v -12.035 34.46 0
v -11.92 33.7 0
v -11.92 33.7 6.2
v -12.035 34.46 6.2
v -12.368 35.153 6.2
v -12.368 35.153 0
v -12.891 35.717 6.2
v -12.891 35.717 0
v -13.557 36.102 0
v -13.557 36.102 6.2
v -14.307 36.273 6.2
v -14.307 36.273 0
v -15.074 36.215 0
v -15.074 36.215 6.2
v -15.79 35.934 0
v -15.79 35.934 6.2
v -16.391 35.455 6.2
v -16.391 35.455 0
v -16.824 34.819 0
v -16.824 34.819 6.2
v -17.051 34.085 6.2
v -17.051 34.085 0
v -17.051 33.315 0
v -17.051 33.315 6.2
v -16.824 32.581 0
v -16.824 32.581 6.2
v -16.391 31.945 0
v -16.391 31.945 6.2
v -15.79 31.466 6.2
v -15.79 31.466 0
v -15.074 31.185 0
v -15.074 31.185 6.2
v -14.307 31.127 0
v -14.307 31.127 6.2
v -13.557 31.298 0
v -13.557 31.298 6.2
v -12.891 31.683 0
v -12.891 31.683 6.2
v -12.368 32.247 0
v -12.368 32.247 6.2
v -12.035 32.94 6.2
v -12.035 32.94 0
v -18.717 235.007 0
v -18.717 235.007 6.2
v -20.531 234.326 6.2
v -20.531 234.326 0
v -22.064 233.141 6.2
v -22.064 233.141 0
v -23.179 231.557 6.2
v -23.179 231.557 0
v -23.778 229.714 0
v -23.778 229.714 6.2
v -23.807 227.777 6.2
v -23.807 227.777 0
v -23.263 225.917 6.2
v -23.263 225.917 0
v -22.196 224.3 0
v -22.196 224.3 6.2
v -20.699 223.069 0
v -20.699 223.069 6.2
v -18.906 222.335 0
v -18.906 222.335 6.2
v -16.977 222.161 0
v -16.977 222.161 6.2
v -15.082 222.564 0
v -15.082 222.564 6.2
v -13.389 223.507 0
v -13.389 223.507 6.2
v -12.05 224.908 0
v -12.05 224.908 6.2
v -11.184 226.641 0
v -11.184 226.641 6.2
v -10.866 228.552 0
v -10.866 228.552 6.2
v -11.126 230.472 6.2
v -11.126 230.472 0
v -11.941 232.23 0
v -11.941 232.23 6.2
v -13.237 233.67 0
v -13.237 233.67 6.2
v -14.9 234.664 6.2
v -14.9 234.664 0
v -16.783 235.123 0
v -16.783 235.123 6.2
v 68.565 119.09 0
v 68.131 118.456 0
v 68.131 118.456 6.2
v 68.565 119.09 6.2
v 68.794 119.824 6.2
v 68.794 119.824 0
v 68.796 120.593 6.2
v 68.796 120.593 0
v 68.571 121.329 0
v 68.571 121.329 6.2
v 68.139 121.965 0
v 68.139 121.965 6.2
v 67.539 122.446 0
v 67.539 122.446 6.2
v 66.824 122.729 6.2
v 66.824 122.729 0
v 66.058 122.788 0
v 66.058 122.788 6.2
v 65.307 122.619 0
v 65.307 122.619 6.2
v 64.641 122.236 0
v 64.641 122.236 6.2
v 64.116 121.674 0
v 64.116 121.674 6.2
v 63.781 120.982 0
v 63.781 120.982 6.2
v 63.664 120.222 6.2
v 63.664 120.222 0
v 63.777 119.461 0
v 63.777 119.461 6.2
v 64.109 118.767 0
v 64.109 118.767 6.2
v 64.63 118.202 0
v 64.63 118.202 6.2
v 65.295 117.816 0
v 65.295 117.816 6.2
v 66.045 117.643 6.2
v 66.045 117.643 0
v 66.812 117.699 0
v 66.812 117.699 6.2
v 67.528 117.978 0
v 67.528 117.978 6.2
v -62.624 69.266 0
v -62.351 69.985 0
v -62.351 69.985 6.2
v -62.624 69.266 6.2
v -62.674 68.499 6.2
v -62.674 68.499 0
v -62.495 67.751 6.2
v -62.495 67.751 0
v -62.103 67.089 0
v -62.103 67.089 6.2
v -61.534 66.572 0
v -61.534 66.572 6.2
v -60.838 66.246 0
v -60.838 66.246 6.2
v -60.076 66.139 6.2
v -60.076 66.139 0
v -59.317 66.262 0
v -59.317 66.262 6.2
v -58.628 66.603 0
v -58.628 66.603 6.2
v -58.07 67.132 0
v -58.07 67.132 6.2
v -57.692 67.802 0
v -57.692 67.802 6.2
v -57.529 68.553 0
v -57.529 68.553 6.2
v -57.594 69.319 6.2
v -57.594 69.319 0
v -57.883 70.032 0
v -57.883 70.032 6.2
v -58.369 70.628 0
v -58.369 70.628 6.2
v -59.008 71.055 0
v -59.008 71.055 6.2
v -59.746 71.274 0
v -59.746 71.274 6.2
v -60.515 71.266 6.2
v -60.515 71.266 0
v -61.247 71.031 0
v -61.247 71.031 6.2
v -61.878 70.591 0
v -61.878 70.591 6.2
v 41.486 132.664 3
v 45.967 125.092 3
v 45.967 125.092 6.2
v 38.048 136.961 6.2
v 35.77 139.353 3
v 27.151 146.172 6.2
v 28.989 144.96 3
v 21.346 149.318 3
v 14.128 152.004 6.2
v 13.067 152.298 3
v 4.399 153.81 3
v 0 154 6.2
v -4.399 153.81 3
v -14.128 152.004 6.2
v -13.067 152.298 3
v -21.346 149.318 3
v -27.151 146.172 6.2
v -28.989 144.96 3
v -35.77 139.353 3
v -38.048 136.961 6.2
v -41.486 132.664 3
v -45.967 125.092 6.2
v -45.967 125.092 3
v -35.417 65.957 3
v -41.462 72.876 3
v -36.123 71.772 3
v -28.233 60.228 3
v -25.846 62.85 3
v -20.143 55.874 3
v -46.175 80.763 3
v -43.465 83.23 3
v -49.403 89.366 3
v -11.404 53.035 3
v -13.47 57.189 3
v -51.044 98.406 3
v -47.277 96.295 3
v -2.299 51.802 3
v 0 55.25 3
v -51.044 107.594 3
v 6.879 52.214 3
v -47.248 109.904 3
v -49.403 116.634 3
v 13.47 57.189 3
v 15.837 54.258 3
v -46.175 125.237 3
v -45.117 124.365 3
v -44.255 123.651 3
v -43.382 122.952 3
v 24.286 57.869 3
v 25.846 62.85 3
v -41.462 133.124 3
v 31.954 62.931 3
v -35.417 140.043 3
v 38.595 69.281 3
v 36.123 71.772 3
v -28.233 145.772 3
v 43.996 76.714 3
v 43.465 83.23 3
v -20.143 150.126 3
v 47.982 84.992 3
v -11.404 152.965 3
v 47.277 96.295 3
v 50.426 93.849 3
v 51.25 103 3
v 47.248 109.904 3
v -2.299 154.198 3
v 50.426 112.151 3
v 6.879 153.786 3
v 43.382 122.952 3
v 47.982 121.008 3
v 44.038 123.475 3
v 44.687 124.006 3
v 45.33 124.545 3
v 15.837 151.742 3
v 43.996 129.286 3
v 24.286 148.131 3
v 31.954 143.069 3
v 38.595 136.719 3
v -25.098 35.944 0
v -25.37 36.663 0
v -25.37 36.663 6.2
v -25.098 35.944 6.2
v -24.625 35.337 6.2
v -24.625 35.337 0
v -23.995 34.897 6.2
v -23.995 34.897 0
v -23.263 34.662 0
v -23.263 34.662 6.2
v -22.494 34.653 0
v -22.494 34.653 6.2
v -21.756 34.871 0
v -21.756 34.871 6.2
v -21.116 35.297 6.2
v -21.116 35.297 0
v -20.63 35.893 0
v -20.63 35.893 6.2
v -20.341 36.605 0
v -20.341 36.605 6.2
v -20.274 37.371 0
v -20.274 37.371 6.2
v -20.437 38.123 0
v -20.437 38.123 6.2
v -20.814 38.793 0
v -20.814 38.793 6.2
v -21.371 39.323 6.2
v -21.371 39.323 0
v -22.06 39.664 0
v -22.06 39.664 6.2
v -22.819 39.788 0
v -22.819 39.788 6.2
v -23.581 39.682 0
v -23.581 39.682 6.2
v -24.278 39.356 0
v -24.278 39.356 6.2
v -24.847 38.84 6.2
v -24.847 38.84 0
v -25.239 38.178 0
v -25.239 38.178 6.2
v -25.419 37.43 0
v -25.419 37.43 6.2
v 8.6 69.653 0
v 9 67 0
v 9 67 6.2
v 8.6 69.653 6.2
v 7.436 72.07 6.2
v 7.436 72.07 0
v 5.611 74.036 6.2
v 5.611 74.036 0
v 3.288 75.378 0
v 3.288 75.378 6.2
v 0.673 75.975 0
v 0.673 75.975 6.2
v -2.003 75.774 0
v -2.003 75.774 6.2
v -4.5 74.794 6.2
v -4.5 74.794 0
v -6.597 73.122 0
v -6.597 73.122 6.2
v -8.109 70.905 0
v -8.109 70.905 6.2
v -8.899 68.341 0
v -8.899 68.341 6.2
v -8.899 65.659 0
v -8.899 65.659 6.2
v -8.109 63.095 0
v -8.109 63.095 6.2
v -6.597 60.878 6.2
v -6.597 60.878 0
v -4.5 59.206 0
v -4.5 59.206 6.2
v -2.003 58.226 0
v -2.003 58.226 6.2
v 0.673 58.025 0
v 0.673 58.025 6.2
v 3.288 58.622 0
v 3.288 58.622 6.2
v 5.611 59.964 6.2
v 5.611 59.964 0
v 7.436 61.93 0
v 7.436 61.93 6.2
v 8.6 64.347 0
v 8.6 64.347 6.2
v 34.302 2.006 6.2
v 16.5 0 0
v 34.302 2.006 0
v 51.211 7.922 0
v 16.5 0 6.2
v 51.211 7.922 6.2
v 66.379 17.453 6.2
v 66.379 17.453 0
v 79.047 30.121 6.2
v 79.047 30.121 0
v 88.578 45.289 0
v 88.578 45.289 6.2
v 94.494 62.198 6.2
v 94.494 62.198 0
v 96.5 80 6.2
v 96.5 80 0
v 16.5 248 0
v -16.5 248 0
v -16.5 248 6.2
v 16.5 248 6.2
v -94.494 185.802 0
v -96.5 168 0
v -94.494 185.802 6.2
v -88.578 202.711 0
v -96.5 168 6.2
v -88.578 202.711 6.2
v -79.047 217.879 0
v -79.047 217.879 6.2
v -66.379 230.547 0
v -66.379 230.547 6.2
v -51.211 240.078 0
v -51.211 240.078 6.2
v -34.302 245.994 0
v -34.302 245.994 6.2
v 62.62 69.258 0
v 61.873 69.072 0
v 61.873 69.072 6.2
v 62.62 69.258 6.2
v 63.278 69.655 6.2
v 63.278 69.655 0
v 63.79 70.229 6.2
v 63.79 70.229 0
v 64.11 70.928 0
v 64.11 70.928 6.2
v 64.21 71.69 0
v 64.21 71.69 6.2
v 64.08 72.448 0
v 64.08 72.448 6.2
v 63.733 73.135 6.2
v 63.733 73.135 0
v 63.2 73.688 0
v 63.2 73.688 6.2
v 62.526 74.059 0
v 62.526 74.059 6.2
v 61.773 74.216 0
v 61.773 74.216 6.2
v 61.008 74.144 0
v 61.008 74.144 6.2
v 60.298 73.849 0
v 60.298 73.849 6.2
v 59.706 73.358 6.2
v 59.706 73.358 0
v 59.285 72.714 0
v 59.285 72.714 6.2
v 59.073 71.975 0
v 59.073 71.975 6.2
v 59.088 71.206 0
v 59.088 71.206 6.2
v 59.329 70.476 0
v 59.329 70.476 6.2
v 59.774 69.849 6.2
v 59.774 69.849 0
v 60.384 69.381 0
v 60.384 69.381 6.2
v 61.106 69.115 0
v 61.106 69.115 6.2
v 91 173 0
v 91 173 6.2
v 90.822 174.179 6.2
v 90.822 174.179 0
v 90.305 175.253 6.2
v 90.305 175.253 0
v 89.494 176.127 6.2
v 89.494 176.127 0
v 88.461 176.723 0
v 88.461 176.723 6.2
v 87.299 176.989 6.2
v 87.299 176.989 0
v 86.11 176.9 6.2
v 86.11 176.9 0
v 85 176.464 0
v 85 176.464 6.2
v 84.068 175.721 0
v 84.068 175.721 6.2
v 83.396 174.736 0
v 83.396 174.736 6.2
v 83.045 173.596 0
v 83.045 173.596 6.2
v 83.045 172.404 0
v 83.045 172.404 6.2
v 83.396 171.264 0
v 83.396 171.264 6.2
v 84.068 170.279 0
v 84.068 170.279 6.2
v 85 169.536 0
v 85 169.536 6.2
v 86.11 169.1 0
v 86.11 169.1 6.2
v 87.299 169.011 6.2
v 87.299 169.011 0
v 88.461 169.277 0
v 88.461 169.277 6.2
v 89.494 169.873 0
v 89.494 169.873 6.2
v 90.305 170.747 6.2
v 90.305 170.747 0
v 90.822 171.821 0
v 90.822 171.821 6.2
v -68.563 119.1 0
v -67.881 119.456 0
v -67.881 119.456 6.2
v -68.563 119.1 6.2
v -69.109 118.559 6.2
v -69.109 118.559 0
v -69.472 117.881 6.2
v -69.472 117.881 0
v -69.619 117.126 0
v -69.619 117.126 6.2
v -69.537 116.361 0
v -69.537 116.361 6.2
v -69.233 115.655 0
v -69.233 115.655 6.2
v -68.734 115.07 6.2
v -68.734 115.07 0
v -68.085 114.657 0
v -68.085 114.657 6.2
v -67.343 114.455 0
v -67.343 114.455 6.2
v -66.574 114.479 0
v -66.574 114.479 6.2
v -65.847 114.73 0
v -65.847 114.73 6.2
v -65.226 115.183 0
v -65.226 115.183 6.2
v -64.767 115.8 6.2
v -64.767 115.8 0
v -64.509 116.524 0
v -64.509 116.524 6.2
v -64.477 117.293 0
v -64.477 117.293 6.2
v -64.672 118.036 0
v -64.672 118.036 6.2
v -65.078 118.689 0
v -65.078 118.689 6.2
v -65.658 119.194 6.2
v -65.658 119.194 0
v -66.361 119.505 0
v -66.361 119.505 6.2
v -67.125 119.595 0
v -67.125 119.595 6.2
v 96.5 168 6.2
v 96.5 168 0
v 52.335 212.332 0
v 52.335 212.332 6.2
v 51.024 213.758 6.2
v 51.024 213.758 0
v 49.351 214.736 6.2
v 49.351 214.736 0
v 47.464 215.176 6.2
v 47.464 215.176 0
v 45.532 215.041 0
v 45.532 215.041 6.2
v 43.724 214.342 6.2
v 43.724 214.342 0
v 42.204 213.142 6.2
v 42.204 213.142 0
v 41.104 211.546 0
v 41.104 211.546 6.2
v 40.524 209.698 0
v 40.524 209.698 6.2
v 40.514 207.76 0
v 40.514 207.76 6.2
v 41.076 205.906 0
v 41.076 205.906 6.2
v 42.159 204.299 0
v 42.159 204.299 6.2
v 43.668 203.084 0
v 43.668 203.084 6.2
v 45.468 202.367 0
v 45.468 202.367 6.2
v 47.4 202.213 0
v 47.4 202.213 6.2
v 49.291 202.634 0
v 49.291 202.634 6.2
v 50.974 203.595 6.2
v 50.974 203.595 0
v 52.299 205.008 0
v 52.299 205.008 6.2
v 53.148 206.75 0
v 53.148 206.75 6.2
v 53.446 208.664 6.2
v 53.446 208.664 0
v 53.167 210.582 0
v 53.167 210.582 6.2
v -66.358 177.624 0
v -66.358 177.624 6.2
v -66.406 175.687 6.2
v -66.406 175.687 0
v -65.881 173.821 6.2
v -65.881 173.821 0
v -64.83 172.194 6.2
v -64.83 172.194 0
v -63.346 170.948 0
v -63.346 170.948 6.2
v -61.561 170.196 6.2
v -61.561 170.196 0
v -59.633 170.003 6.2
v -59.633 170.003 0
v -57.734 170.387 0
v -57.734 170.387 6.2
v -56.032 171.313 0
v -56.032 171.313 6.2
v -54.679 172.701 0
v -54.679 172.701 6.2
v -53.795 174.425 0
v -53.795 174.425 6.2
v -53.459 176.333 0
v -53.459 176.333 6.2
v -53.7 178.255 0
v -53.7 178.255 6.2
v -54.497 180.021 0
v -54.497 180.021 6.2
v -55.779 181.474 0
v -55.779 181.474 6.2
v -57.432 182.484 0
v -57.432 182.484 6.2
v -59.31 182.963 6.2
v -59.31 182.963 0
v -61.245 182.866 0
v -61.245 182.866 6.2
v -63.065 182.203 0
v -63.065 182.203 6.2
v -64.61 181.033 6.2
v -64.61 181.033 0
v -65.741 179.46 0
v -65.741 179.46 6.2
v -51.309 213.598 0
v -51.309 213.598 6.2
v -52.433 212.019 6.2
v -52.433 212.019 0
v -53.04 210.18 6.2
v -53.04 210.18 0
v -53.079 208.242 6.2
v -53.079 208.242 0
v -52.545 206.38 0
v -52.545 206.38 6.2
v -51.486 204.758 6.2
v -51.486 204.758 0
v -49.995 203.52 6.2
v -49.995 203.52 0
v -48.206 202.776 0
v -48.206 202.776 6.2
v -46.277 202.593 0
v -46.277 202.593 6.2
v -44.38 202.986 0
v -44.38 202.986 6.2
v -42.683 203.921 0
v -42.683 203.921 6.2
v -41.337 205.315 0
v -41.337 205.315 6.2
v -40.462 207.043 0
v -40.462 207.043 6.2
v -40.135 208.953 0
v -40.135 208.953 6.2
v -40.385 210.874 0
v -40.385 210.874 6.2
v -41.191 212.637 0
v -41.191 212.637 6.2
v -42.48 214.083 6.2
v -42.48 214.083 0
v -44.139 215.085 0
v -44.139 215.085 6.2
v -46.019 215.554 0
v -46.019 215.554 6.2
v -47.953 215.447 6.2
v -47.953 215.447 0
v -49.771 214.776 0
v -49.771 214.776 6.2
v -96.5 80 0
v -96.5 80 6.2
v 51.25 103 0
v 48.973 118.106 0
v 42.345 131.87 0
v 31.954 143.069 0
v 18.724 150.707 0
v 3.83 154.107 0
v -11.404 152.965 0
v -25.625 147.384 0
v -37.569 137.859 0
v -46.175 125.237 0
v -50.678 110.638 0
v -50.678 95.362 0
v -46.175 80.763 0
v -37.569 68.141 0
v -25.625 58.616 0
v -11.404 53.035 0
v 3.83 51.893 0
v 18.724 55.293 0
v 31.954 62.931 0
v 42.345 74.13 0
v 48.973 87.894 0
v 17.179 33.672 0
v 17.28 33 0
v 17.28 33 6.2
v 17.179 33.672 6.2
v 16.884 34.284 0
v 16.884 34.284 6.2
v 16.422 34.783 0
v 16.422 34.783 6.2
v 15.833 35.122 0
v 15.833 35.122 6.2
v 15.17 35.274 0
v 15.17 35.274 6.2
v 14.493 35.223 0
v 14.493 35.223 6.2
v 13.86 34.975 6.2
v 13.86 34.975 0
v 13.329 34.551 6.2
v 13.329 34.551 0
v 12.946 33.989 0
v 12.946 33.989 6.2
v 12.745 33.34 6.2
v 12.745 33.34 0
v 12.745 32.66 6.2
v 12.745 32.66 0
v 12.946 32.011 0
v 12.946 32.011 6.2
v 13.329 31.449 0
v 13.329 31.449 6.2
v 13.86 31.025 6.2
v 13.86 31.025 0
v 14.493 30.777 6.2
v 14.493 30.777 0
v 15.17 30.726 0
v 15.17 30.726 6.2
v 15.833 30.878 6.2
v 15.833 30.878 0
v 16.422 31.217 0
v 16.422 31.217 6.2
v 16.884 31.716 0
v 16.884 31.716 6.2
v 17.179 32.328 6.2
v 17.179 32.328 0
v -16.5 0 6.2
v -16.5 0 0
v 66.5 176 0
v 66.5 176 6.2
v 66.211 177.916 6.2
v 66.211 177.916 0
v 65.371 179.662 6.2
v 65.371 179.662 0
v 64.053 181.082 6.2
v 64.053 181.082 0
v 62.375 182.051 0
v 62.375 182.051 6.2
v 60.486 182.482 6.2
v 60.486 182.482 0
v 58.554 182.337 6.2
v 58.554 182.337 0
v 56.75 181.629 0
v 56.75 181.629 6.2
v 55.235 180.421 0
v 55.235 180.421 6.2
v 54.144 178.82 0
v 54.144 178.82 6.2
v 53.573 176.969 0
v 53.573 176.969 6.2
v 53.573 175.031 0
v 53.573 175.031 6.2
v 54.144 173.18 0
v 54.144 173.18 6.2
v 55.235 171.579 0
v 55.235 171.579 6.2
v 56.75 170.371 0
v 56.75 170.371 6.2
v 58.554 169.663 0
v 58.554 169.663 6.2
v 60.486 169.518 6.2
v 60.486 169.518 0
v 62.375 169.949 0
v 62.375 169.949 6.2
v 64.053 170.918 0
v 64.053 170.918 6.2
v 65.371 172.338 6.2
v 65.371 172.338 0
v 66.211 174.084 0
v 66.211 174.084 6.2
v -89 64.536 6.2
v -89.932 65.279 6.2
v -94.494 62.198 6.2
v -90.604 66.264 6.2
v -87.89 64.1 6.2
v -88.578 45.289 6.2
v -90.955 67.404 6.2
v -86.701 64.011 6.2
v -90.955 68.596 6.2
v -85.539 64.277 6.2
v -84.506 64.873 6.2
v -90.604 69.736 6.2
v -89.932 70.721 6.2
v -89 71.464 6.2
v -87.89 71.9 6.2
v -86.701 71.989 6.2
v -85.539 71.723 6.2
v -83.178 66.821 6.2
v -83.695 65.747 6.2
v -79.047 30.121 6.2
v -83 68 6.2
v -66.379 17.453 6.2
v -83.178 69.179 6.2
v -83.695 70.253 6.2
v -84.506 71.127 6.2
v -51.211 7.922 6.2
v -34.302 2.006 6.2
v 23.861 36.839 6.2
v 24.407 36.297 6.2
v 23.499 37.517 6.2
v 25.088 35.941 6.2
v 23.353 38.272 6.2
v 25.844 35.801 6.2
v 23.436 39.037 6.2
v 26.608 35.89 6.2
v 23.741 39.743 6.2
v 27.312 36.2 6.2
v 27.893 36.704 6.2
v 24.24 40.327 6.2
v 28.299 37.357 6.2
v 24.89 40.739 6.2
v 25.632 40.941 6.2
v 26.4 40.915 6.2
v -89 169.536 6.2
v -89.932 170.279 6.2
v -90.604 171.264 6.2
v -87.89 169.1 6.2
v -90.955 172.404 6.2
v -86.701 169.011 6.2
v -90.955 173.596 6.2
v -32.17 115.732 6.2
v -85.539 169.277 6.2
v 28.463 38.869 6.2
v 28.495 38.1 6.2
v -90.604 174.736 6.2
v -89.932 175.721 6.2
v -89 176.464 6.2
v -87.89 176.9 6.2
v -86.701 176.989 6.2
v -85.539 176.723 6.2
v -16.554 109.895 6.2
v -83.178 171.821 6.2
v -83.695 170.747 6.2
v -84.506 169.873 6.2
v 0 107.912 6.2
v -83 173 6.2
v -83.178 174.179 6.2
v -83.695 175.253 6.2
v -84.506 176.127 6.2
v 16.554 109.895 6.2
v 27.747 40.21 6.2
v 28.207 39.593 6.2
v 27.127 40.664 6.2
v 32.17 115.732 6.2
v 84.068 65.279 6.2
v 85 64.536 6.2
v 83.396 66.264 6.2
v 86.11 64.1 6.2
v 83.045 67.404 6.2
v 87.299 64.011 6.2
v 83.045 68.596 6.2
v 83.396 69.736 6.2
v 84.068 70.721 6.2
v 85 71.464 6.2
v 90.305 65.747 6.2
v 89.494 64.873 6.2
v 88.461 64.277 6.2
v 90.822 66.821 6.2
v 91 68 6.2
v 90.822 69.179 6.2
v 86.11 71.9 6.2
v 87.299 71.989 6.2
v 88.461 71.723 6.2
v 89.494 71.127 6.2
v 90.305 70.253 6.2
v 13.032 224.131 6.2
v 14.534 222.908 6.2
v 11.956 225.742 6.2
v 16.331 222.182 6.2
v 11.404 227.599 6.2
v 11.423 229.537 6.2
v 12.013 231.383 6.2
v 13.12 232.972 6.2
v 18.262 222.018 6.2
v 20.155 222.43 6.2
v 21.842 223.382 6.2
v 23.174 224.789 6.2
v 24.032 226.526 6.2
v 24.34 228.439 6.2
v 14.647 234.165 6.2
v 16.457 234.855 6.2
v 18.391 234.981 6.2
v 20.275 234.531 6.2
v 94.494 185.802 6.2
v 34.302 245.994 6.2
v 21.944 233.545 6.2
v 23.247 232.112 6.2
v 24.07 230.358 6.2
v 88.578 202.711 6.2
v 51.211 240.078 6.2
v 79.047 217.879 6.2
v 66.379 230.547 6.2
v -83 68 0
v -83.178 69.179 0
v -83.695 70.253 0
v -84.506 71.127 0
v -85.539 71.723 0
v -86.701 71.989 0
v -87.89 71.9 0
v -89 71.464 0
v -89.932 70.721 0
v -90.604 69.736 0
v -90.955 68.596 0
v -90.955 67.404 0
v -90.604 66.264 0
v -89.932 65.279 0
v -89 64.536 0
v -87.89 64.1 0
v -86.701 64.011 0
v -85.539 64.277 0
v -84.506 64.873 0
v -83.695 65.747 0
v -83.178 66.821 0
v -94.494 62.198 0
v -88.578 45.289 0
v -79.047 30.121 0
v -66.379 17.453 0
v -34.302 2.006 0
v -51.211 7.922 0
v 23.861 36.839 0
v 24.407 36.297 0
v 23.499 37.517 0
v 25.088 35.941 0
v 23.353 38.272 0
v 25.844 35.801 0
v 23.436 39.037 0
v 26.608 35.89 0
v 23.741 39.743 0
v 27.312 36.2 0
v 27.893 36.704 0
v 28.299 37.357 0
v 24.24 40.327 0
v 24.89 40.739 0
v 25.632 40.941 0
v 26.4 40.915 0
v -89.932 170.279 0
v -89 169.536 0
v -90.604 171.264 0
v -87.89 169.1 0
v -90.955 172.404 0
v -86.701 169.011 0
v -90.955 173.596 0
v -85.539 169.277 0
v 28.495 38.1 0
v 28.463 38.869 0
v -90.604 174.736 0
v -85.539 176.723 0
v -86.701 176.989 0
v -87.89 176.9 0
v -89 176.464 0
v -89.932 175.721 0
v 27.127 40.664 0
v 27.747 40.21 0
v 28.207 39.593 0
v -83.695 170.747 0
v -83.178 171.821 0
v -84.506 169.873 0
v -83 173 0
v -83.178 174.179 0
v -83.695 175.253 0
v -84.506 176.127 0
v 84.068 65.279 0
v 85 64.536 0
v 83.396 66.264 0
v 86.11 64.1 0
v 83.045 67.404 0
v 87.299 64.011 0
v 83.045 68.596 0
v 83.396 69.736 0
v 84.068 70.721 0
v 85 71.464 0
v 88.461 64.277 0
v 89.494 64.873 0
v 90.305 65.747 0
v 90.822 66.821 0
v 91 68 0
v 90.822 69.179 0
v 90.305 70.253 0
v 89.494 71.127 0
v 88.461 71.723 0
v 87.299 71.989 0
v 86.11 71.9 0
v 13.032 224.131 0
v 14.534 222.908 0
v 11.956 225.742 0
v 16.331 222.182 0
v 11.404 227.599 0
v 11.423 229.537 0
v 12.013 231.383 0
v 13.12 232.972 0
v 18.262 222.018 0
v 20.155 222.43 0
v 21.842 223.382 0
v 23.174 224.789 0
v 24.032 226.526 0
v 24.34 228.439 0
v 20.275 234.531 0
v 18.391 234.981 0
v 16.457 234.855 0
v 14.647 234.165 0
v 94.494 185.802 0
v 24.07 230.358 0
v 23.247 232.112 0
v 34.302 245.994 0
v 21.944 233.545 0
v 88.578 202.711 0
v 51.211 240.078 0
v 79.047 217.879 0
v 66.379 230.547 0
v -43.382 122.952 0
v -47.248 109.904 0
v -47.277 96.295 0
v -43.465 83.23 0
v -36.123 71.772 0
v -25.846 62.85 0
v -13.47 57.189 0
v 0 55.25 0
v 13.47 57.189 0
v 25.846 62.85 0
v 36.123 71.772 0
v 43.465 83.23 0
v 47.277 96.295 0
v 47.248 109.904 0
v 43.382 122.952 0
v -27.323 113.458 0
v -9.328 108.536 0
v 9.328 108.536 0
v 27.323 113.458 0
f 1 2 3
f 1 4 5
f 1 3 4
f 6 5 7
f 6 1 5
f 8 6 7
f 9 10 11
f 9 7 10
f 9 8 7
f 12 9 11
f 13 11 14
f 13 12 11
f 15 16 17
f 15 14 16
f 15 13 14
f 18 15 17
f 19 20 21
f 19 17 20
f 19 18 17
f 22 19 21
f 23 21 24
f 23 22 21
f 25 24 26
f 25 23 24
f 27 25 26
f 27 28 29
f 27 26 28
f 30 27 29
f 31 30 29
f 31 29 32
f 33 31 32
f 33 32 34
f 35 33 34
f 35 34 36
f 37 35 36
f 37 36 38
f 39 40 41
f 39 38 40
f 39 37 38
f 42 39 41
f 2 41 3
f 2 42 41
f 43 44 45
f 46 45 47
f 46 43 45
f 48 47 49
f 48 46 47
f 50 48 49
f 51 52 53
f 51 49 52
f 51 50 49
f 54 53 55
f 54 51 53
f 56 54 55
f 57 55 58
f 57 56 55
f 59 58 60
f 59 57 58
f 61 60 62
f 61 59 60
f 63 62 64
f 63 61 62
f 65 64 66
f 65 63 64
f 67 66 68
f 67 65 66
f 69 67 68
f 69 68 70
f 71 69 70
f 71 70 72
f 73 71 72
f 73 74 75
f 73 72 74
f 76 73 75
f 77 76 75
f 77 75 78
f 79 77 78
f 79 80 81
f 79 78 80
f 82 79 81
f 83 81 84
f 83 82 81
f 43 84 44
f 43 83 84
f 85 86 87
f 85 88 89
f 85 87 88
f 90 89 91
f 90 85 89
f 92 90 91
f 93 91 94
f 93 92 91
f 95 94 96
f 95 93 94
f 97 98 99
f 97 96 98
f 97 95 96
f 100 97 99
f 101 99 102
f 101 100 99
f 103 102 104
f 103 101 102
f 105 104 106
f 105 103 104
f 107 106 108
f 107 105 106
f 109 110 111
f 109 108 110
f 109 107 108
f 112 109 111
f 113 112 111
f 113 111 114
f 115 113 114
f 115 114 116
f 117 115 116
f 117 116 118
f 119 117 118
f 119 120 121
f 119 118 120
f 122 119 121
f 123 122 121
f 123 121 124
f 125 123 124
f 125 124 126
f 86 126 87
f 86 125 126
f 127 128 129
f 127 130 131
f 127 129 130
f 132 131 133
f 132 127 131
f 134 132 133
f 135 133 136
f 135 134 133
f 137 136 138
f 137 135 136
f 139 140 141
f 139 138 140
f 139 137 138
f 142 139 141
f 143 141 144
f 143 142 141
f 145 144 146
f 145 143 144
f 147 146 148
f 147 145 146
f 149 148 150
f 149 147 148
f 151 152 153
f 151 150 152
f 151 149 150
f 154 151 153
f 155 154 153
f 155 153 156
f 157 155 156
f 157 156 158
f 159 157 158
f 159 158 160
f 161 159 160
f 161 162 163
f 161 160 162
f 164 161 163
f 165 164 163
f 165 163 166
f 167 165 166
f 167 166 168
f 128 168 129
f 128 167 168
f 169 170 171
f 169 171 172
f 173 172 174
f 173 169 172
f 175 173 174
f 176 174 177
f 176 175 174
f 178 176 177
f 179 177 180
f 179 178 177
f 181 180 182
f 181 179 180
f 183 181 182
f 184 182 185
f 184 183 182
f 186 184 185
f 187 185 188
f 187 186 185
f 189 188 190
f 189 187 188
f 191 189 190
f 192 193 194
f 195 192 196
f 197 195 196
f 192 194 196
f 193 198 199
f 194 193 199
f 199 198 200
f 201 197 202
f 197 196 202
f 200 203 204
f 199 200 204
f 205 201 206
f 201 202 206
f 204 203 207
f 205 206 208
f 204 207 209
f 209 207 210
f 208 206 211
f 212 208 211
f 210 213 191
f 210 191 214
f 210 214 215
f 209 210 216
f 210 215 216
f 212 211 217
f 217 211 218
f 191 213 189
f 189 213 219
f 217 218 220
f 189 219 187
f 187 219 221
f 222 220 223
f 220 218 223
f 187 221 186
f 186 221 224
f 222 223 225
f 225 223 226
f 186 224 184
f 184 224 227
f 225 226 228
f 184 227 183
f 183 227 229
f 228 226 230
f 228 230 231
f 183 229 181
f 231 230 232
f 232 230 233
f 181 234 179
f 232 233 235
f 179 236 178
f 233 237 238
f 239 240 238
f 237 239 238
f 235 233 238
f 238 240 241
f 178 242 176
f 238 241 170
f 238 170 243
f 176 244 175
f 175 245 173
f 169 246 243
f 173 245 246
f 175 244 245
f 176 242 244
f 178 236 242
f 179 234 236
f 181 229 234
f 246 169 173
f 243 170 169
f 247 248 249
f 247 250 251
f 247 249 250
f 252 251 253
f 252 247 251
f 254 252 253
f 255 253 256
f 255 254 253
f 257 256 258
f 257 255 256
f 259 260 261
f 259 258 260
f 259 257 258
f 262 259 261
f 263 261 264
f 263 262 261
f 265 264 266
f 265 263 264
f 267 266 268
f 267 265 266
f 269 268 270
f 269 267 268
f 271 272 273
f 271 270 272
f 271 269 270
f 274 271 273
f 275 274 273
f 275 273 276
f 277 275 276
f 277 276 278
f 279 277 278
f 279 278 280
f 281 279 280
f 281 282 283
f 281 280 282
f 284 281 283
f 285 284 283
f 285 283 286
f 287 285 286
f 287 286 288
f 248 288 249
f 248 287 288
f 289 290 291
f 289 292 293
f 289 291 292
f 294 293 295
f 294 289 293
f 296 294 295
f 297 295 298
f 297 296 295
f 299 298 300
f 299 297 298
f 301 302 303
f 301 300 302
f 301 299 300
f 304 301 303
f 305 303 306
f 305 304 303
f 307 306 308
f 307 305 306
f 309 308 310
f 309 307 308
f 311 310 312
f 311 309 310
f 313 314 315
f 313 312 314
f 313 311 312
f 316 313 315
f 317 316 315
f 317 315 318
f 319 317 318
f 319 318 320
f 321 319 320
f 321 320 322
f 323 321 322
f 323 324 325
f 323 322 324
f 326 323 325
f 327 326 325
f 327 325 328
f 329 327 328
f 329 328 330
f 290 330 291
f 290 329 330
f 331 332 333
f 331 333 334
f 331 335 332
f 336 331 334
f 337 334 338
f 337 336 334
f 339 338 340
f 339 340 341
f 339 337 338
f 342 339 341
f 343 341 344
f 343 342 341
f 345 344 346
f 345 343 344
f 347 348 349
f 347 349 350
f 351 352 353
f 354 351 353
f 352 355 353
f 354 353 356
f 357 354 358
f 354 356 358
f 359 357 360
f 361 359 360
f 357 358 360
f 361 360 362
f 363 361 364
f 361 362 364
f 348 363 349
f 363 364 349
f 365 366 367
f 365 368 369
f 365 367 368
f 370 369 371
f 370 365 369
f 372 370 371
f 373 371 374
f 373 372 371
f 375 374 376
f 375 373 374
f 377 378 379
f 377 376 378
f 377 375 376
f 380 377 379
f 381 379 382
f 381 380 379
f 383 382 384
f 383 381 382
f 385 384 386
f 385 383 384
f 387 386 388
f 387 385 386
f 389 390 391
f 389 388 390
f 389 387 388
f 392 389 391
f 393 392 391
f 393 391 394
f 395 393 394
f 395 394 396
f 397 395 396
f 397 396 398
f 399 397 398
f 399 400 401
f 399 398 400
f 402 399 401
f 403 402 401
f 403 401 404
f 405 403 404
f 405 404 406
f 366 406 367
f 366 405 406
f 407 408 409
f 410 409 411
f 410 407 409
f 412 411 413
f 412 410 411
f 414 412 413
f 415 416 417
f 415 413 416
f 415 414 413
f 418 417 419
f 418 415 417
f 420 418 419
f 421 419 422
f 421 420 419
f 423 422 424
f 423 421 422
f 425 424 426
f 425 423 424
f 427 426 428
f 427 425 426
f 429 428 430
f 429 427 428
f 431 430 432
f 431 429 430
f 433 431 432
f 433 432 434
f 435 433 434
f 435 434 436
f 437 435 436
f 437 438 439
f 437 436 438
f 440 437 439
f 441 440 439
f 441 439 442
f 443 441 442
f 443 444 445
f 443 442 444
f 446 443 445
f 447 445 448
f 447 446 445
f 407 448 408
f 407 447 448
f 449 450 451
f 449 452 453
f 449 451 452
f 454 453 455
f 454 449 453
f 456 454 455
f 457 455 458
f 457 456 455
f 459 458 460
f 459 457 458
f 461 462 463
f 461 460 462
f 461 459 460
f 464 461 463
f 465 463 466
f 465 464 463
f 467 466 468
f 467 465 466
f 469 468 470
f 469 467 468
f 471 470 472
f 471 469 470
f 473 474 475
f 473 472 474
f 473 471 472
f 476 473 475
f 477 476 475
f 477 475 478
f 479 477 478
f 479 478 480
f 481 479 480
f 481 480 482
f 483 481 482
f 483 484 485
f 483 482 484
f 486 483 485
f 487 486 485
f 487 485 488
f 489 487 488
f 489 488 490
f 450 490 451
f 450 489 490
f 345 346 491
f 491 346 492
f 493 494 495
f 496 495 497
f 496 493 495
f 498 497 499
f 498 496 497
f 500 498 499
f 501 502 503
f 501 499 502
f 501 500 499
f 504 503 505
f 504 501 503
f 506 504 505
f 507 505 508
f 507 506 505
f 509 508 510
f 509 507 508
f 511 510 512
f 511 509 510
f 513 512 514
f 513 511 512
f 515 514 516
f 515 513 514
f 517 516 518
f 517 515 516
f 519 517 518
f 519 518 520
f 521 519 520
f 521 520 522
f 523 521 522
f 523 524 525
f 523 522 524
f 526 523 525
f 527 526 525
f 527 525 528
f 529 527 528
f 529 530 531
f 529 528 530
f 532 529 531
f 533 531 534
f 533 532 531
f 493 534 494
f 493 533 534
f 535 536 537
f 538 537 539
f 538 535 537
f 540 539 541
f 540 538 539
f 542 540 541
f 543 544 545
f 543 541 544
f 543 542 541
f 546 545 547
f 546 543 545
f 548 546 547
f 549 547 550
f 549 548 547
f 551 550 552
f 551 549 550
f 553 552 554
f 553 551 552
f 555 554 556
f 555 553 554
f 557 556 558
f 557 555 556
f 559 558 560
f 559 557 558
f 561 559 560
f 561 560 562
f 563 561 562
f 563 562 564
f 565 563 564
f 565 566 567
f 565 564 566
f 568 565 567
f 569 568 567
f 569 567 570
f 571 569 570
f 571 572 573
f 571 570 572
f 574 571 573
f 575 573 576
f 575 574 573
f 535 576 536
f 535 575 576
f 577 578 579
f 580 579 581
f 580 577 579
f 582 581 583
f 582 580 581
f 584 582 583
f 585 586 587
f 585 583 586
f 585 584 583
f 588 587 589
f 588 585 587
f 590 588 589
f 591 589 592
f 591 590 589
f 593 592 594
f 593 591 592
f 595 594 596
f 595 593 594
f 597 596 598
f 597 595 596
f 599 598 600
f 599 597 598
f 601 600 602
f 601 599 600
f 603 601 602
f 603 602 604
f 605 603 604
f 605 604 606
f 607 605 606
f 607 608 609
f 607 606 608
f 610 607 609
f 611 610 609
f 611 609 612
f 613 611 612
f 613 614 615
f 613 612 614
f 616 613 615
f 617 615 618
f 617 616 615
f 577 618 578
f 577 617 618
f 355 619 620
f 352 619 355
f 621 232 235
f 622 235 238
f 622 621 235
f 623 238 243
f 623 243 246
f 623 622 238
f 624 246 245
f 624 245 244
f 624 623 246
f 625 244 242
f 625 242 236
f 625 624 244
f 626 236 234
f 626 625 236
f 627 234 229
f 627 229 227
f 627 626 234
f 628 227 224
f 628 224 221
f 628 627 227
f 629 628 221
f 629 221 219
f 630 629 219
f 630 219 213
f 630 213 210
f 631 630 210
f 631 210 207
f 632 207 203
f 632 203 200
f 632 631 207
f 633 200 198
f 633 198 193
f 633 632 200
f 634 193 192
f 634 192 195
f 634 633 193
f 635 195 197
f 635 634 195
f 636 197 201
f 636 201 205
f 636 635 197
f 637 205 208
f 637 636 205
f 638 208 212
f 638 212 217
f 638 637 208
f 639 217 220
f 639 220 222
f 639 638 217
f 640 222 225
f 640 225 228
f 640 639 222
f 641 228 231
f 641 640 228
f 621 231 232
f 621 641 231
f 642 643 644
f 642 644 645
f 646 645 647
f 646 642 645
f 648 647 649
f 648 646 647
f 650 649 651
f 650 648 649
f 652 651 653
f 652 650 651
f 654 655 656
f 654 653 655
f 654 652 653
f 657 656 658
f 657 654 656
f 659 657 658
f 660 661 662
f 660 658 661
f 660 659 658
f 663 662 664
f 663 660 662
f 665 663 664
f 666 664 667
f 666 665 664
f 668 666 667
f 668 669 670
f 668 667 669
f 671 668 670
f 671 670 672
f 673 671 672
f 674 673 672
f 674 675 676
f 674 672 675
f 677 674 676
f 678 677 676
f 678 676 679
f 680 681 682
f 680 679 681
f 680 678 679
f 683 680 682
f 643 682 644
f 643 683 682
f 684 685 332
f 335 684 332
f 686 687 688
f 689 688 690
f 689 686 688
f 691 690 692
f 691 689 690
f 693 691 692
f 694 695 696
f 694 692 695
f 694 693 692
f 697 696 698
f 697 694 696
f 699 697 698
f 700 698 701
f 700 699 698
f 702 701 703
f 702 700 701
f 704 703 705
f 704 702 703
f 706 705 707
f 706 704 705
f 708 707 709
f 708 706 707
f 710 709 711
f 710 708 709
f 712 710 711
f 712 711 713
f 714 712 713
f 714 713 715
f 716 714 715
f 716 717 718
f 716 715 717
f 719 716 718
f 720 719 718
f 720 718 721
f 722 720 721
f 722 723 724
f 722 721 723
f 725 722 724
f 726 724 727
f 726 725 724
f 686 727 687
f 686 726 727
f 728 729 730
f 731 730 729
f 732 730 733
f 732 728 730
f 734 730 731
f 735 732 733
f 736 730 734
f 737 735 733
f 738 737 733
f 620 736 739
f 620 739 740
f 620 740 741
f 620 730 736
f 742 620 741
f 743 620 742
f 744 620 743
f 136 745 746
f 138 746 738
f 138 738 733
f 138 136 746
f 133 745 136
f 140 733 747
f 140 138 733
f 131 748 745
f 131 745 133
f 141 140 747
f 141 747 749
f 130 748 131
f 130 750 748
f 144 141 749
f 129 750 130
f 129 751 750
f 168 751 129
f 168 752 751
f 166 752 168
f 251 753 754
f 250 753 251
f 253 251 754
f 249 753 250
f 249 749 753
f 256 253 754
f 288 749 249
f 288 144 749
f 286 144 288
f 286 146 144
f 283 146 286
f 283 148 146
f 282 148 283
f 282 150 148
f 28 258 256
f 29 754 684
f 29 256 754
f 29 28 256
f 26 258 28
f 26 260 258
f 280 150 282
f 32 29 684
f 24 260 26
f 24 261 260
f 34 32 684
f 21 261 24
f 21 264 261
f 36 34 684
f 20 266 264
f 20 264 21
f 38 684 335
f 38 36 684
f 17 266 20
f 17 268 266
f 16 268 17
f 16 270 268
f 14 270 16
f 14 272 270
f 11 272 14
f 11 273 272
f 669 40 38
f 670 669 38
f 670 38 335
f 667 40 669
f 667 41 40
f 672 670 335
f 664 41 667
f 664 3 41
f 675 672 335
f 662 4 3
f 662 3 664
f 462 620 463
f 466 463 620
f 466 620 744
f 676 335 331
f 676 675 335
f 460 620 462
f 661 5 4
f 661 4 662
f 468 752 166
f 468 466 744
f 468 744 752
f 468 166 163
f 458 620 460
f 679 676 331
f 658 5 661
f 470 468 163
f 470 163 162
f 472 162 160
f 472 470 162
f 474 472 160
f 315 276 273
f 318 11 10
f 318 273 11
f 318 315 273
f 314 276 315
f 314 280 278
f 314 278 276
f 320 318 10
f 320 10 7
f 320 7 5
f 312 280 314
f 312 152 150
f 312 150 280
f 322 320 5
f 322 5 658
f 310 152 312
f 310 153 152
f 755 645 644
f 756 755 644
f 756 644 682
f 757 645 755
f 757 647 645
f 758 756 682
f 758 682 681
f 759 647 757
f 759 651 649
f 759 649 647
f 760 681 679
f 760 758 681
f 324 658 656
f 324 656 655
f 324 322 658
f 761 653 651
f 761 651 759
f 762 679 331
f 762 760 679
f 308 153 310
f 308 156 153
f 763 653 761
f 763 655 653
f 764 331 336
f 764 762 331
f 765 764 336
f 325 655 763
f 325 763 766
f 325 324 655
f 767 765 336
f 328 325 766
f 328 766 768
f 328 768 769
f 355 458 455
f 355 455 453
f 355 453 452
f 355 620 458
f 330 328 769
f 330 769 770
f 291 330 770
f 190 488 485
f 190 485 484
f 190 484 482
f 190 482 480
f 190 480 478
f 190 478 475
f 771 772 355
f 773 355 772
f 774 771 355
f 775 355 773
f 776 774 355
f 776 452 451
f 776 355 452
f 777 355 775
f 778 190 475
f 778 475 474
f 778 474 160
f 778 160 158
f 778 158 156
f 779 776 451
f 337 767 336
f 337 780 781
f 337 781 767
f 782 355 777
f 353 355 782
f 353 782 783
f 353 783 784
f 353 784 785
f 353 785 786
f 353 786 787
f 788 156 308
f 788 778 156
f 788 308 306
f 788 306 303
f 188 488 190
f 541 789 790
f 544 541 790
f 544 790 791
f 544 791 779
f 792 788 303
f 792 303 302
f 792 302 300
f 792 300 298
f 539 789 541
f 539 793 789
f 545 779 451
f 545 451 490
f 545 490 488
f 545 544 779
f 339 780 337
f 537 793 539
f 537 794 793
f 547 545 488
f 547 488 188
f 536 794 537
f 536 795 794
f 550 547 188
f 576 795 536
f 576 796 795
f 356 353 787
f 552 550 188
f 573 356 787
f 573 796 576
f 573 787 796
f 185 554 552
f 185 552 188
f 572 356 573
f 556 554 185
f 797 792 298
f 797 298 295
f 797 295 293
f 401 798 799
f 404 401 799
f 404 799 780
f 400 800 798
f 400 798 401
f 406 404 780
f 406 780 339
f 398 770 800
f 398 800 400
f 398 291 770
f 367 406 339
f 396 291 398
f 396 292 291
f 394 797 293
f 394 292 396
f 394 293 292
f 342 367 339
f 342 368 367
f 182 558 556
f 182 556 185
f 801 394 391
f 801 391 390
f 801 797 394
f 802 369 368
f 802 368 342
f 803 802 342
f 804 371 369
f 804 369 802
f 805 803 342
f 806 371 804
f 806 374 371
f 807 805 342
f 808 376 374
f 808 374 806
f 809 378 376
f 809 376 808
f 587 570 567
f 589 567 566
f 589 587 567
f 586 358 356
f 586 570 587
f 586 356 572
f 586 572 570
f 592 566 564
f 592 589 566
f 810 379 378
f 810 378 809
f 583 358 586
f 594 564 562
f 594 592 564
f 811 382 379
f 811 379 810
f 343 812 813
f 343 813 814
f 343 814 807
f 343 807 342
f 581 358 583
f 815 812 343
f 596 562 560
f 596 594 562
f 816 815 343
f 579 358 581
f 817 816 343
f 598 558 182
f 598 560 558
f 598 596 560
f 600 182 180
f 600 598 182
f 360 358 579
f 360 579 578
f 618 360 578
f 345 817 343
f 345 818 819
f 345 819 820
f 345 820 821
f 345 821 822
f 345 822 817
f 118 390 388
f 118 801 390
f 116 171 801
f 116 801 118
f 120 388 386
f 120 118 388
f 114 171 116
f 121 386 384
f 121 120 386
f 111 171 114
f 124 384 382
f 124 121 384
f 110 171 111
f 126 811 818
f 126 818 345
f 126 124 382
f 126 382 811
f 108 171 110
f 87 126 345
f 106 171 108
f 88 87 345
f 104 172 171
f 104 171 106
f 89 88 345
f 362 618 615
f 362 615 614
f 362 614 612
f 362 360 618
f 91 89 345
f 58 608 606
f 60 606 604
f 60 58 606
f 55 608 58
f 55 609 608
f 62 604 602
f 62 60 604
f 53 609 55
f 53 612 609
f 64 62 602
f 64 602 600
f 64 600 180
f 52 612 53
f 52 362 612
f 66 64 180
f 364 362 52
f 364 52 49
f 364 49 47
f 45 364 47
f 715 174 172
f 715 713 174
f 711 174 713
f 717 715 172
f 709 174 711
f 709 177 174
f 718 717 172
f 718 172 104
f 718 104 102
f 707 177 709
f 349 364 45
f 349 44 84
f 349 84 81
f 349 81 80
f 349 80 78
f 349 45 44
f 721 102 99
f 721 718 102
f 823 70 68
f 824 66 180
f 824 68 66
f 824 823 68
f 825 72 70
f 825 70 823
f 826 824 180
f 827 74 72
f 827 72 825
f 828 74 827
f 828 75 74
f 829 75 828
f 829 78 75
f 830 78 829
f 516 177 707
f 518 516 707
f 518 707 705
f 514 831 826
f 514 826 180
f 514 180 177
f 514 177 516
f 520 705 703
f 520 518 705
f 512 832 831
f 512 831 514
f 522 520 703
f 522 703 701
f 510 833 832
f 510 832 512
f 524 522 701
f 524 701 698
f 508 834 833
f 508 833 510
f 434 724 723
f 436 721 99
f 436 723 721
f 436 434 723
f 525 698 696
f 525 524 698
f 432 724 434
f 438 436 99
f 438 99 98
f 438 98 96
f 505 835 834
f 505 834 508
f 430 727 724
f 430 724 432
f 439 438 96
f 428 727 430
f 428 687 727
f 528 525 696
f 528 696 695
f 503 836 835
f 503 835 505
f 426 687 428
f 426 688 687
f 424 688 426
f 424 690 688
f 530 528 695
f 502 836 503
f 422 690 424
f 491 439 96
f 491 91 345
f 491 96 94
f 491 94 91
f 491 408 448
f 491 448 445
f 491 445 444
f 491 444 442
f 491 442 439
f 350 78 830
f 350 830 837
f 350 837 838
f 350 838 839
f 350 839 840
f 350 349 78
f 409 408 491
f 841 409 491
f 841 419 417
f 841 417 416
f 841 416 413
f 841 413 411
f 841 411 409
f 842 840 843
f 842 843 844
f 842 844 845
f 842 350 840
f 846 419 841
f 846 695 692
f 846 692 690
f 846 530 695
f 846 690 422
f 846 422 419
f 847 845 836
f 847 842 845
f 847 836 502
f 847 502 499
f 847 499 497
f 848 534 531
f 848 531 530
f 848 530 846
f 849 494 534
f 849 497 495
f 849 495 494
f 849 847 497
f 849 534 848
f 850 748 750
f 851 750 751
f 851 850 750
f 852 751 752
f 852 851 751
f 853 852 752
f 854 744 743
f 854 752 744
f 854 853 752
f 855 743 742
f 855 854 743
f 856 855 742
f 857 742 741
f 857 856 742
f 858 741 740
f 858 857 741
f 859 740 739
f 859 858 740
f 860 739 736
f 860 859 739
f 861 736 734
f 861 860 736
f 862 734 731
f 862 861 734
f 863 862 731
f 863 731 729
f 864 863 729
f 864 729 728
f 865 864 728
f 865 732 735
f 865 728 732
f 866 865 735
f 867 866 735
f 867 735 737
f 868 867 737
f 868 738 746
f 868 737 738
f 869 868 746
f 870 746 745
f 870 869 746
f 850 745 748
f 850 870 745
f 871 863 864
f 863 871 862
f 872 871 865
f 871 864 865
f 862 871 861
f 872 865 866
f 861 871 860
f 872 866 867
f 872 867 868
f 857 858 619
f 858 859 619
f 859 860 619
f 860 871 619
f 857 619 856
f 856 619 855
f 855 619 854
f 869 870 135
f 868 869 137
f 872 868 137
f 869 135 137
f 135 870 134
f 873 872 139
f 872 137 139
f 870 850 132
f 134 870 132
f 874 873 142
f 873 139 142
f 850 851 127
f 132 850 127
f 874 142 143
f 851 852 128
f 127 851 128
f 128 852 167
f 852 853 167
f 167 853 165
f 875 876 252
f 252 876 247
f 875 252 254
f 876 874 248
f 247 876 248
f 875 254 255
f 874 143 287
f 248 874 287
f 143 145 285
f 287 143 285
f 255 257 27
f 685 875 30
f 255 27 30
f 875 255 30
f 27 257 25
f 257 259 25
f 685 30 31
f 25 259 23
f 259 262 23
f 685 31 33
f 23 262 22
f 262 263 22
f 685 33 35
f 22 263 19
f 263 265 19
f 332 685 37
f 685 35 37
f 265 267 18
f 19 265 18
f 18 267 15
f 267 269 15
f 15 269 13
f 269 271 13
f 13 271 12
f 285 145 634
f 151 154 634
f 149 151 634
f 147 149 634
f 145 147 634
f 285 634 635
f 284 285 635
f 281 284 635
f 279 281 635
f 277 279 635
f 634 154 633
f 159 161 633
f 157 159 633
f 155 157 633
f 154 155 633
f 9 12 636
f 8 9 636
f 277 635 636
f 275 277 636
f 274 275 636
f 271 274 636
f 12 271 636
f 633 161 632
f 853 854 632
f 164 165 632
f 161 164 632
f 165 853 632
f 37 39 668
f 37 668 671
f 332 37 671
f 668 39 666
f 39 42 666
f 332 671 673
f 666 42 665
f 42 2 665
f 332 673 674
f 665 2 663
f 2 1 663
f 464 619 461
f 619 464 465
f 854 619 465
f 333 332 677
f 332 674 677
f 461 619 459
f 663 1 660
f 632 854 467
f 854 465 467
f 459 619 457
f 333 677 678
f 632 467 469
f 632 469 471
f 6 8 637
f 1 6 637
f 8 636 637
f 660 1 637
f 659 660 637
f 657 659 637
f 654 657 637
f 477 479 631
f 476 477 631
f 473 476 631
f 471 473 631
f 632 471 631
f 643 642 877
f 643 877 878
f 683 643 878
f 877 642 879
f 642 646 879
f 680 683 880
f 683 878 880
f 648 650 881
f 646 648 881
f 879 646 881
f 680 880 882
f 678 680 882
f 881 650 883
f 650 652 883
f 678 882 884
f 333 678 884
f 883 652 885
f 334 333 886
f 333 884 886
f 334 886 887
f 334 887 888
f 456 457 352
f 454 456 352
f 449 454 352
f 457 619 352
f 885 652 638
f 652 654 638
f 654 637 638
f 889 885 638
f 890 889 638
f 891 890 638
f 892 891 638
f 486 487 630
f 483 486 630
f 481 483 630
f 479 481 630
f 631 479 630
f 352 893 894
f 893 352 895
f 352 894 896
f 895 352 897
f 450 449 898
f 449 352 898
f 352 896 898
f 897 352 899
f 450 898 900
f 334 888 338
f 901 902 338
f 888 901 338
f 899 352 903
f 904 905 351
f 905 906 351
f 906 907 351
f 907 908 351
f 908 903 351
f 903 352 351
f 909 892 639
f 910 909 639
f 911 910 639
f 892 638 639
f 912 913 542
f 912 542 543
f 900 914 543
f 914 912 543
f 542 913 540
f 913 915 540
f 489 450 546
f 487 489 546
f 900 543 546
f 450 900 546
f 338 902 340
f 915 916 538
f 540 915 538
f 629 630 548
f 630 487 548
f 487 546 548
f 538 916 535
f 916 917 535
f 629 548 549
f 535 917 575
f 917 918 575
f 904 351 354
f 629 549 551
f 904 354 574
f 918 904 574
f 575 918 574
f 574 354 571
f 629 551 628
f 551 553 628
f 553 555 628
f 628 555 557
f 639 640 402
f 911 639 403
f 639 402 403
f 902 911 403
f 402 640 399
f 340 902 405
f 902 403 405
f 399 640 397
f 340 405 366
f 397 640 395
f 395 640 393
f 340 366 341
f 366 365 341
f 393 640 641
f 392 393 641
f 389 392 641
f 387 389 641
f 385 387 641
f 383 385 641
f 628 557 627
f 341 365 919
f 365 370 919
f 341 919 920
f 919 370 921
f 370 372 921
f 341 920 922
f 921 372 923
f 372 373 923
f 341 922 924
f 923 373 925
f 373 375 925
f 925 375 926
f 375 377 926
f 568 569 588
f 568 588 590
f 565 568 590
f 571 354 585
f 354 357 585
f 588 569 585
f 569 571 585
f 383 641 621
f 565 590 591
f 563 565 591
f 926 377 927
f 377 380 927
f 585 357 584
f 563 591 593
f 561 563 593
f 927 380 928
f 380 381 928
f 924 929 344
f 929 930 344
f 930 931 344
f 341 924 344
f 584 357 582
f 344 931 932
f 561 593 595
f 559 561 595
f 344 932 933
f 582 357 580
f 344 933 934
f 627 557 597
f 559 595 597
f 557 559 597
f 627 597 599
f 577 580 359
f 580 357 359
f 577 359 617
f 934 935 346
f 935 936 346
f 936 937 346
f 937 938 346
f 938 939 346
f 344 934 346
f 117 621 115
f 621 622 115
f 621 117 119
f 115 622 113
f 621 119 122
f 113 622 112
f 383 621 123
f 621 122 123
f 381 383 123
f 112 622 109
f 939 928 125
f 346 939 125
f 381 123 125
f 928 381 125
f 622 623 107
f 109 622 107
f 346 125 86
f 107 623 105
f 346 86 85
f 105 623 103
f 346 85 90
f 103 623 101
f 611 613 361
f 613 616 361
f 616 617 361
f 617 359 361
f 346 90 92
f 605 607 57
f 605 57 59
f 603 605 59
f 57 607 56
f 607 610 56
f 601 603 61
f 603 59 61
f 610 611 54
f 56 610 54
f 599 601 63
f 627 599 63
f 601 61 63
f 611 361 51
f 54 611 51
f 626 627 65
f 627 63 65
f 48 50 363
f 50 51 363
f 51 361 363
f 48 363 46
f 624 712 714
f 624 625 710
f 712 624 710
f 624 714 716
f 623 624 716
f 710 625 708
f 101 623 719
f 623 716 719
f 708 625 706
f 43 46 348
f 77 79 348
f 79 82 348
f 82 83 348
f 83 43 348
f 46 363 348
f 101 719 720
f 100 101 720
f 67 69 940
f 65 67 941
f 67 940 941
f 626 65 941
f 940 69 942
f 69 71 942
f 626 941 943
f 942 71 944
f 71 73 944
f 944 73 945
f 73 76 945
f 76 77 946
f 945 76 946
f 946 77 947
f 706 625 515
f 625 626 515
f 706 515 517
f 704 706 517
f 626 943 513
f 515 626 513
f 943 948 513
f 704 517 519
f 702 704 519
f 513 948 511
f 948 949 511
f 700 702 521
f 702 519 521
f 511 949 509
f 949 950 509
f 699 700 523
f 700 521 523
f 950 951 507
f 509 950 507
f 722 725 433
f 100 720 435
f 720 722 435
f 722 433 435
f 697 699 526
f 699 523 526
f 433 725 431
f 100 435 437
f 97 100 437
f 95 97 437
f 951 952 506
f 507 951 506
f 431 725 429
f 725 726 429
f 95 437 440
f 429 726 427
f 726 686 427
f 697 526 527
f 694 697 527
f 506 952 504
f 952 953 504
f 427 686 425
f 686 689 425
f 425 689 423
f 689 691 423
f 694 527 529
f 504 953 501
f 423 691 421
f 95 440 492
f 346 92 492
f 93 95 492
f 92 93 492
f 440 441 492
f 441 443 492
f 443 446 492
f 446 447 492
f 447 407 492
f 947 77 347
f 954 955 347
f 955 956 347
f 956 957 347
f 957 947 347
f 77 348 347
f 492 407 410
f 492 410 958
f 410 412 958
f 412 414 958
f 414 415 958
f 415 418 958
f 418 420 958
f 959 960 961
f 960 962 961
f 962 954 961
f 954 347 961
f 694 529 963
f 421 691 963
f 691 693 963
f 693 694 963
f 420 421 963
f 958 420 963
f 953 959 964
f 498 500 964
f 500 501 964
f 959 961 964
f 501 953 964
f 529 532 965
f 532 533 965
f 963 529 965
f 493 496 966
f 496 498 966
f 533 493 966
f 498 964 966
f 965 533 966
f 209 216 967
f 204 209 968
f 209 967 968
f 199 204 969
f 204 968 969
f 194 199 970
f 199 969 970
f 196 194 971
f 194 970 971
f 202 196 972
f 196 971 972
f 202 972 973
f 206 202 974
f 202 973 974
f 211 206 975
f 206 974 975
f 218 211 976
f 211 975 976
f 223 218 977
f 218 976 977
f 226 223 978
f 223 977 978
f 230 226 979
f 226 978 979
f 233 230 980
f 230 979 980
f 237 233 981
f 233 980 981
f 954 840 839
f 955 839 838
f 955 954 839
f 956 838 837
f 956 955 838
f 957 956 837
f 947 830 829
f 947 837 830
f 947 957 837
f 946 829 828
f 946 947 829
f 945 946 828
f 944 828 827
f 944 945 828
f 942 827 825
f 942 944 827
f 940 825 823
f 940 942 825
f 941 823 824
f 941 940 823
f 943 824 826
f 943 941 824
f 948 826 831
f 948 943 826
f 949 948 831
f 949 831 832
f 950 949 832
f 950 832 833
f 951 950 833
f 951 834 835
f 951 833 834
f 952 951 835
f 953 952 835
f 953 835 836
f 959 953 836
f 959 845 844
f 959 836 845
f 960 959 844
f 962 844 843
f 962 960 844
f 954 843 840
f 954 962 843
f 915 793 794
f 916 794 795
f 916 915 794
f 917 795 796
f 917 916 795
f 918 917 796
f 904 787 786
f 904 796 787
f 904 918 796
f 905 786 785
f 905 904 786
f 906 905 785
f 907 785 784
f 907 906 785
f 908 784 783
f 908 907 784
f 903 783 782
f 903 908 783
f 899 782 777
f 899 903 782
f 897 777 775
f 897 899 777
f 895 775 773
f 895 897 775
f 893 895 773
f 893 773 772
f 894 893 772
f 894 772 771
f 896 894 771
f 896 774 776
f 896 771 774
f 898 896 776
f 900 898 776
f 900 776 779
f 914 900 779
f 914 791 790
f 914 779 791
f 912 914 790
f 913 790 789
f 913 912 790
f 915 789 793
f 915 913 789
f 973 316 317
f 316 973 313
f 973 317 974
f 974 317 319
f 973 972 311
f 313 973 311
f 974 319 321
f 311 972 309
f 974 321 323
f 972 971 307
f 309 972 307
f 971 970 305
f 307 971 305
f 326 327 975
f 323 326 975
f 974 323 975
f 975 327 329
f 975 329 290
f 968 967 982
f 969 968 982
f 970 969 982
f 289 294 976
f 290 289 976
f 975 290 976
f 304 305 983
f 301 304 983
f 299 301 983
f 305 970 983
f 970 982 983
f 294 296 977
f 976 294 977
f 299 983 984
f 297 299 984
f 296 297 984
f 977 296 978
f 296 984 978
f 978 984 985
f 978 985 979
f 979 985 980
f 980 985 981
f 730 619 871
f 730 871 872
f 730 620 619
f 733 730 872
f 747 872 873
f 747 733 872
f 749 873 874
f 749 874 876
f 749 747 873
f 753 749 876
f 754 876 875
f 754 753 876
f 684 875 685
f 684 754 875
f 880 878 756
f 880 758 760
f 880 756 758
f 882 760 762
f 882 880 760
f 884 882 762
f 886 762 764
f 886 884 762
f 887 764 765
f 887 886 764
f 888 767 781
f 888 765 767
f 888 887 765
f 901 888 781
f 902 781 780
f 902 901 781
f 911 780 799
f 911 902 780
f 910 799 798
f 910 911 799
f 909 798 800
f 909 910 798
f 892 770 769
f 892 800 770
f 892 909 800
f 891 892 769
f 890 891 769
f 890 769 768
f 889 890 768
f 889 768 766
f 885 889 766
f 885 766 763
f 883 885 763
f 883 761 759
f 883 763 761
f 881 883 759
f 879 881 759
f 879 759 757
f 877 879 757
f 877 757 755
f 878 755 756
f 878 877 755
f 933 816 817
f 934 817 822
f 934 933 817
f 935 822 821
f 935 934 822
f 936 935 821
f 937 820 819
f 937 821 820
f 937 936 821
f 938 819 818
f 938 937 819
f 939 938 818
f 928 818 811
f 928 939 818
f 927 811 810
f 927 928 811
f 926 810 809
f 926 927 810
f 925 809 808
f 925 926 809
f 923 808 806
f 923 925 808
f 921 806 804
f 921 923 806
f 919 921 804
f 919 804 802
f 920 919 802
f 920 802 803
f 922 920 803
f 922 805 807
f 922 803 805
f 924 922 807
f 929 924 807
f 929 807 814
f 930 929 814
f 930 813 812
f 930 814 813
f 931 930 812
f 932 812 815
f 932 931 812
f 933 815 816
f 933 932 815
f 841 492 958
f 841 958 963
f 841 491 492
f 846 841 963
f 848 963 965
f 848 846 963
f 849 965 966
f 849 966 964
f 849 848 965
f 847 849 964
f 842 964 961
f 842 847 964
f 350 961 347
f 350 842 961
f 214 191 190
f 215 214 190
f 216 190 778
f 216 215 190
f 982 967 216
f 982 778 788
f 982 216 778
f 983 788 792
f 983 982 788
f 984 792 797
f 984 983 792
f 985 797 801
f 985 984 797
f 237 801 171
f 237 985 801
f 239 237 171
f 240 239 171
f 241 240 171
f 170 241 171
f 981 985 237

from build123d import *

# Parameters (mm, degrees)
CYLINDER170_R         = 6.5
CYLINDER170_DEPTH     = 10
ARRAY001_COUNT        = 6
ARRAY001_ANGLE        = 170
CYLINDER012_R         = 2.579687
CYLINDER012_DEPTH     = 19.5
ARRAY_COUNT           = 6
ARRAY_ANGLE           = 208
ARRAY_PLACEMENT_ANGLE = 109
CYLINDER052_R         = 47.75
CYLINDER052_DEPTH     = 3
CYLINDER051_R         = 51.25
CYLINDER051_DEPTH     = 3
CYLINDER164_R         = 2.28
CYLINDER164_DEPTH     = 29
CYLINDER163_R         = 2.58
CYLINDER163_DEPTH     = 29
CYLINDER159_R         = 9
CYLINDER159_DEPTH     = 21
CYLINDER165_R         = 4
CYLINDER165_DEPTH     = 10
CYLINDER166_R         = 4
CYLINDER166_DEPTH     = 10
CYLINDER167_R         = 4
CYLINDER167_DEPTH     = 10
CYLINDER168_R         = 4
CYLINDER168_DEPTH     = 10
CYLINDER005_R         = 51
CYLINDER005_DEPTH     = 20
CYLINDER004_R         = 70.0875
CYLINDER004_DEPTH     = 20
BOX_W                 = 193
BOX_H                 = 248
BOX_DEPTH             = 6.2
FILLET_R              = 80


with BuildPart() as array001:
    # Cylinder170 → Cylinder170 (new body)
    with BuildSketch(Plane(origin=(60, 181, 0), x_dir=(1, 0, 0), z_dir=(0, 0, 1))):
        Circle(CYLINDER170_R)
    extrude(amount=CYLINDER170_DEPTH)

    # Array001: Array001 ×6 about axis
    array001_axis = Axis((0, 176, 0), (0, 0, 1))


with BuildPart() as array001_1:
    add(array001.part)
    for i in range(1, ARRAY001_COUNT):
        add(array001.part.rotate(array001_axis, i * ARRAY001_ANGLE / (ARRAY001_COUNT - 1)))


with BuildPart() as array001_2:
    # Array001 placement: moved
    add(array001_1.part.moved(Location((0, -5, 0))))


with BuildPart() as turbomounts:
    # Cylinder012 → Cylinder012 (new body)
    with BuildSketch(Plane(origin=(36.025, 58.5, -4), x_dir=(1, 0, 0), z_dir=(0, 0, 1))):
        Circle(CYLINDER012_R)
    extrude(amount=CYLINDER012_DEPTH)

    # Array: TurboMounts ×6 about axis
    array_axis = Axis((0, 0, 0), (0, 0, 1))


with BuildPart() as turbomounts_1:
    add(turbomounts.part)
    for i in range(1, ARRAY_COUNT):
        add(turbomounts.part.rotate(array_axis, i * ARRAY_ANGLE / (ARRAY_COUNT - 1)))


with BuildPart() as turbomounts_2:
    # Array placement: moved
    add(turbomounts_1.part.moved(Location((0, 102, 0))).rotate(Axis((0, 102, 0), (0, 0, 1)), ARRAY_PLACEMENT_ANGLE))


with BuildPart() as flange002:
    # Cylinder052 → Cylinder052 (new body)
    with BuildSketch(Plane(origin=(0, 68, 0), x_dir=(1, 0, 0), z_dir=(0, 0, 1))):
        Circle(CYLINDER052_R)
    extrude(amount=CYLINDER052_DEPTH)


with BuildPart() as centeringringgroove:
    # Cylinder051 → Cylinder051 (new body)
    with BuildSketch(Plane(origin=(0, 68, 0), x_dir=(1, 0, 0), z_dir=(0, 0, 1))):
        Circle(CYLINDER051_R)
    extrude(amount=CYLINDER051_DEPTH)

    # Cut001: cut Flange002
    add(flange002.part, mode=Mode.SUBTRACT)


with BuildPart() as centeringringgroove_1:
    # Cut001 placement: moved
    add(centeringringgroove.part.moved(Location((0, 35, 0))))


with BuildPart() as cylinder016:
    # Cylinder164 → Cylinder164 (new body)
    with BuildSketch(Plane(origin=(15, 33, -9), x_dir=(1, 0, 0), z_dir=(0, 0, 1))):
        Circle(CYLINDER164_R)
    extrude(amount=CYLINDER164_DEPTH)


with BuildPart() as cylinder015:
    # Cylinder163 → Cylinder163 (new body)
    with BuildSketch(Plane(origin=(-14.5, 33.7, -7), x_dir=(1, 0, 0), z_dir=(0, 0, 1))):
        Circle(CYLINDER163_R)
    extrude(amount=CYLINDER163_DEPTH)


with BuildPart() as cylinder011:
    # Cylinder159 → Cylinder159 (new body)
    with BuildSketch(Plane(origin=(0, 67, -4), x_dir=(1, 0, 0), z_dir=(0, 0, 1))):
        Circle(CYLINDER159_R)
    extrude(amount=CYLINDER159_DEPTH)


with BuildPart() as cylinder017:
    # Cylinder165 → Cylinder165 (new body)
    with BuildSketch(Plane(origin=(-87, 173, 0), x_dir=(1, 0, 0), z_dir=(0, 0, 1))):
        Circle(CYLINDER165_R)
    extrude(amount=CYLINDER165_DEPTH)


with BuildPart() as cylinder018:
    # Cylinder166 → Cylinder166 (new body)
    with BuildSketch(Plane(origin=(87, 68, 0), x_dir=(1, 0, 0), z_dir=(0, 0, 1))):
        Circle(CYLINDER166_R)
    extrude(amount=CYLINDER166_DEPTH)


with BuildPart() as cylinder019:
    # Cylinder167 → Cylinder167 (new body)
    with BuildSketch(Plane(origin=(-87, 68, 0), x_dir=(1, 0, 0), z_dir=(0, 0, 1))):
        Circle(CYLINDER167_R)
    extrude(amount=CYLINDER167_DEPTH)


with BuildPart() as cylinder020:
    # Cylinder168 → Cylinder168 (new body)
    with BuildSketch(Plane(origin=(87, 173, 0), x_dir=(1, 0, 0), z_dir=(0, 0, 1))):
        Circle(CYLINDER168_R)
    extrude(amount=CYLINDER168_DEPTH)


with BuildPart() as cylinder005:
    # Cylinder005 → Cylinder005 (new body)
    with BuildSketch(Plane(origin=(0, 74, 0), x_dir=(1, 0, 0), z_dir=(0, 0, 1))):
        Circle(CYLINDER005_R)
    extrude(amount=CYLINDER005_DEPTH)


with BuildPart() as fusion001:
    # Cylinder004 → Cylinder004 (new body)
    with BuildSketch(Plane(origin=(0, 149, 0), x_dir=(1, 0, 0), z_dir=(0, 0, 1))):
        Circle(CYLINDER004_R)
    extrude(amount=CYLINDER004_DEPTH)

    # Common: intersect Cylinder005
    add(cylinder005.part, mode=Mode.INTERSECT)


with BuildPart() as fusion001_1:
    # Common placement: moved
    add(fusion001.part.moved(Location((0, 29, 0))))

    # Fusion: union TurboMounts, CenteringRingGroove, Cylinder016, Cylinder015, Cylinder011, Cylinder017, Cylinder018, Cylinder019, Cylinder020
    add(turbomounts_2.part)
    add(centeringringgroove_1.part)
    add(cylinder016.part)
    add(cylinder015.part)
    add(cylinder011.part)
    add(cylinder017.part)
    add(cylinder018.part)
    add(cylinder019.part)
    add(cylinder020.part)

    # Fusion001: union Array001
    add(array001_2.part)


with BuildPart() as cut021:
    # Box → Box (new body)
    with BuildSketch(Plane(origin=(-96.5, 0, 0), x_dir=(1, 0, 0), z_dir=(0, 0, 1))):
        with Locations((96.5, 124)):
            Rectangle(BOX_W, BOX_H)
    extrude(amount=BOX_DEPTH)

    # Fillet
    fillet_edges = [cut021.edges().sort_by_distance(p)[0] for p in [
        (-96.5, 0, 3.1),
        (-96.5, 248, 3.1),
        (96.5, 0, 3.1),
        (96.5, 248, 3.1),
    ]]
    fillet(fillet_edges, radius=FILLET_R)

    # Cut021: cut Fusion001
    add(fusion001_1.part, mode=Mode.SUBTRACT)


solid = cut021.part
